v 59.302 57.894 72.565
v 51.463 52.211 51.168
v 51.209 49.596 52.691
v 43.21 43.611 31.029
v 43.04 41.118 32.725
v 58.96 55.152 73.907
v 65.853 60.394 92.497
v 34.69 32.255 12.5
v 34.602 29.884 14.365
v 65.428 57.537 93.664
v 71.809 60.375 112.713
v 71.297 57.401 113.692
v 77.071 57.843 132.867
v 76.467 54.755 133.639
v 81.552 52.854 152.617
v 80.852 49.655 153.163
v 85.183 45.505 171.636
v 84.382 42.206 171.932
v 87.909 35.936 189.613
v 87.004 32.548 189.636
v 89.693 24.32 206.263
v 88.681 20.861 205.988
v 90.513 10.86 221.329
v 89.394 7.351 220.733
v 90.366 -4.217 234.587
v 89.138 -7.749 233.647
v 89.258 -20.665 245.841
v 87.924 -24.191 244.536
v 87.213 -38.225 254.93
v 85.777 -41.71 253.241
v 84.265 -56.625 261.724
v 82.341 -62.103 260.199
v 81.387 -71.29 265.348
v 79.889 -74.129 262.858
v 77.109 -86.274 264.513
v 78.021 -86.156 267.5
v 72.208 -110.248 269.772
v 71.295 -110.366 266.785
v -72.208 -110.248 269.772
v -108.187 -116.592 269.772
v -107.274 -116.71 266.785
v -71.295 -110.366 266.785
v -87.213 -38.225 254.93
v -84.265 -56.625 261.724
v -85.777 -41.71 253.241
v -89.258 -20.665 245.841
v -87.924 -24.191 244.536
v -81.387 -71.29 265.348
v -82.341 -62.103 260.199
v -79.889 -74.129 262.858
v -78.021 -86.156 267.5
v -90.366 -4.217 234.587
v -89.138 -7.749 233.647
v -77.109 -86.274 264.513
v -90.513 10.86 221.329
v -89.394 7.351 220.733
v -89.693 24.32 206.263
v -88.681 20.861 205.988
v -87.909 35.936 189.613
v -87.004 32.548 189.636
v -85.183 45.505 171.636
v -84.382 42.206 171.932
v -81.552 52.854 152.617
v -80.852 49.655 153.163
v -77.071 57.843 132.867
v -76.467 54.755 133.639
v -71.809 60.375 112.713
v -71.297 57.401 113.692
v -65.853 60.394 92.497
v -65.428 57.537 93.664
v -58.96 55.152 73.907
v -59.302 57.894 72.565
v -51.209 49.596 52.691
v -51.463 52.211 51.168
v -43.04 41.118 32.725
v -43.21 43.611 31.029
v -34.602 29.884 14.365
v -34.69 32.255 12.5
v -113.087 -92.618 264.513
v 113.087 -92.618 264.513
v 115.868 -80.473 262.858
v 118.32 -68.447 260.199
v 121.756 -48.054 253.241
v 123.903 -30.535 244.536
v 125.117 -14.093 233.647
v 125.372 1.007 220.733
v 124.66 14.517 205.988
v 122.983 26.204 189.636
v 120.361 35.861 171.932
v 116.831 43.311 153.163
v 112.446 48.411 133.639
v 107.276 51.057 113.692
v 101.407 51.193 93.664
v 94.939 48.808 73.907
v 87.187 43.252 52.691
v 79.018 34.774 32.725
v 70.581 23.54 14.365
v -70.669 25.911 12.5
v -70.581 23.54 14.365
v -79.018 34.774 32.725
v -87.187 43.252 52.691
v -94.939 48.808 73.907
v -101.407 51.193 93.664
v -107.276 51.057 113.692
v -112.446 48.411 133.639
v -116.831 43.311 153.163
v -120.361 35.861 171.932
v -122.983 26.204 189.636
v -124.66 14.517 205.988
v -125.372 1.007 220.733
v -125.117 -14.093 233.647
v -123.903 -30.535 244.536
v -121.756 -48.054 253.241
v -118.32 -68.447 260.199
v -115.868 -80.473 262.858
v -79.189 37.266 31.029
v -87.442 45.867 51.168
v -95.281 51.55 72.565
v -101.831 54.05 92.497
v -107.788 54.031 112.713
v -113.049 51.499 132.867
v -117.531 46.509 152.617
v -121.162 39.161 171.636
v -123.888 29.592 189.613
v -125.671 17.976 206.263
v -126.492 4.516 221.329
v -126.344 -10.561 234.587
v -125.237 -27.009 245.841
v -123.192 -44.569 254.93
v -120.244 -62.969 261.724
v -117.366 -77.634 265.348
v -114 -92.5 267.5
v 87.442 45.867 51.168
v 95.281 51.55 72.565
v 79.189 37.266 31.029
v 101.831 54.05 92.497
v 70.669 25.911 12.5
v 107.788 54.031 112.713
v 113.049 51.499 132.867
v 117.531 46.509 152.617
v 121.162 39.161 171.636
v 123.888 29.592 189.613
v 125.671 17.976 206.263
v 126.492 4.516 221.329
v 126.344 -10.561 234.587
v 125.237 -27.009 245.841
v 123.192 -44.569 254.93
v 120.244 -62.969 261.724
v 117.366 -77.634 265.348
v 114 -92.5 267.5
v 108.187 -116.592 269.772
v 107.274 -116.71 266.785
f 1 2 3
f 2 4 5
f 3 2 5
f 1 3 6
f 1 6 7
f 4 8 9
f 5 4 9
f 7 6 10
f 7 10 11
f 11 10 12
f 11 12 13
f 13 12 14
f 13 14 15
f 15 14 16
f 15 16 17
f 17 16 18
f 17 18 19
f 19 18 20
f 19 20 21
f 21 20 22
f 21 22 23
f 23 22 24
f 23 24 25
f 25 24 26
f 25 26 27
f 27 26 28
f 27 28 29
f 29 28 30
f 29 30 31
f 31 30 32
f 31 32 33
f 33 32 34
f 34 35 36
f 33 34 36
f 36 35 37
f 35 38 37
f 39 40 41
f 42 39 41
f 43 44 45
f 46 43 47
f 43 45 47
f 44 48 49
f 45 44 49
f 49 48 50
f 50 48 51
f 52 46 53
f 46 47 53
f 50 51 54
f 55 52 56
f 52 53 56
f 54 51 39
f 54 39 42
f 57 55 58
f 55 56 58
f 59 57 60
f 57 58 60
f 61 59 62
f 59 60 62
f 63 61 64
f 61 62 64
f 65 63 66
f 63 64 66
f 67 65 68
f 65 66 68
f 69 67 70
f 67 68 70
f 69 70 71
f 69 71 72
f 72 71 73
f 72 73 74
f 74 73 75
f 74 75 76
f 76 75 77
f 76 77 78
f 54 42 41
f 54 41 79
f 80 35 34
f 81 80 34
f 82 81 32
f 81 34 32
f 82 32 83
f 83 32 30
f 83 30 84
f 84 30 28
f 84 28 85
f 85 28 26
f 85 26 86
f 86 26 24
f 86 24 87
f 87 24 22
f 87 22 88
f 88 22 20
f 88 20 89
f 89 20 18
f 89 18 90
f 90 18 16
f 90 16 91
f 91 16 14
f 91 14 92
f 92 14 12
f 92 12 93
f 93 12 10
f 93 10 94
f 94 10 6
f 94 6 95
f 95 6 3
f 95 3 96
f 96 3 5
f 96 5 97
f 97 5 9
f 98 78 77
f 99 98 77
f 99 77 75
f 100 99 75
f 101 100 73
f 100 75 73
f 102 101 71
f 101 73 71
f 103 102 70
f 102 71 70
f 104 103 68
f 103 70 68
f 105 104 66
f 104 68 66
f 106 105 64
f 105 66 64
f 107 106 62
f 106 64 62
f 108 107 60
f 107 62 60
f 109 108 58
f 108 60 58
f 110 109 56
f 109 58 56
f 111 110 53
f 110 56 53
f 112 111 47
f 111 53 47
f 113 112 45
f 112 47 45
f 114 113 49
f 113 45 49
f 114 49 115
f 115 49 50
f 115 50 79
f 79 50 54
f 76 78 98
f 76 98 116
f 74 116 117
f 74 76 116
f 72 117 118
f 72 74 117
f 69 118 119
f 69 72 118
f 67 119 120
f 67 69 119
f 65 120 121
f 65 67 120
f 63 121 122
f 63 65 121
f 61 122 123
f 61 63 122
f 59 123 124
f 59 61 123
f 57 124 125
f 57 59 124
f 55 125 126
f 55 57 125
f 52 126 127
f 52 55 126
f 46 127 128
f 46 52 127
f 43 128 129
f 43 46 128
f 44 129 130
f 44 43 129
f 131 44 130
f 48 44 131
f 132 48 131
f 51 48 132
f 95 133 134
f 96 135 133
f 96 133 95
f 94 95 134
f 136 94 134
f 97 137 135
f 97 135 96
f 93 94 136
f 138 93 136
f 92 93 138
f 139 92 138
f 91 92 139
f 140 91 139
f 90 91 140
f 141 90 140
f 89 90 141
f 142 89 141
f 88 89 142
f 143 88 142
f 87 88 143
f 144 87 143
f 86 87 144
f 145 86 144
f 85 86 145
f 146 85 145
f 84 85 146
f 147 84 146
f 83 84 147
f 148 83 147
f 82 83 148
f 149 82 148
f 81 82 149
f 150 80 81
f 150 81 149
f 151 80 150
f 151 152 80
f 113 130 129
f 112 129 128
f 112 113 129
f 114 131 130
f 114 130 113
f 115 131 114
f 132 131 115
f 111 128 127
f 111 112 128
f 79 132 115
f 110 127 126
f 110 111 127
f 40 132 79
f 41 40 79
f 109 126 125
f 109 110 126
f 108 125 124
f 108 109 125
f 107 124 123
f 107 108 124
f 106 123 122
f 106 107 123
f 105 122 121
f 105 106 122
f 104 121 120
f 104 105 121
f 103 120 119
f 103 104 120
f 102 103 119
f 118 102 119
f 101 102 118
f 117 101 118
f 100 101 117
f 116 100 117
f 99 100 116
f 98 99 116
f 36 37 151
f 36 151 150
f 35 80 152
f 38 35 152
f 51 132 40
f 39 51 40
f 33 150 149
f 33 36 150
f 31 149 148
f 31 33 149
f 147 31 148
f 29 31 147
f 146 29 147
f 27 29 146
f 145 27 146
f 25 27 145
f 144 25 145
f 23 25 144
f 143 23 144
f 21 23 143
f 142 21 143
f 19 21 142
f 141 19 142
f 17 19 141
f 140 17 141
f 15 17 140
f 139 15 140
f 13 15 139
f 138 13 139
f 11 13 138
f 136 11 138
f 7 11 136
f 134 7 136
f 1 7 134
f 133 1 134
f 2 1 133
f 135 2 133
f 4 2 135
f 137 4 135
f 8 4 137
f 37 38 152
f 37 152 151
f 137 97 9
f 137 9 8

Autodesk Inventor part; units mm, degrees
ref_plane "XY Plane" through (0, 0, 0) normal (0, 0, 1) x (1, 0, 0)
ref_plane "作業平面2" through (70.6693, 25.9112, 12.5) normal (0.9287275, -0.2499237, -0.2738674) x (0.1523203, -0.4162505, 0.8964006)
ref_plane "作業平面1" through (70.6693, 25.9112, 12.5) normal (0, -0.906984, -0.421165) x (0.1523203, -0.4162505, 0.8964006)
ref_plane "作業平面5" through (72.5487, 25.2272, 16.5) normal (0.9848078, -0.1736482, 0) x (0, 0, 1)
ref_plane "作業平面4" through (0, 0, 0) normal (0.9848078, -0.1736482, 0) x (0, 0, 1)
sketch "スケッチ4" plane through (72.5487, 25.2272, 16.5) normal (0.9848078, -0.1736482, 0) x (0, 0, 1)
  arc A0 (-4, -0.3473) -> (251, 108.7407) centre (93.9958, 123.1646) ccw
  arc A1 (-2.1354, 2.0028) -> (248.0126, 109.0151) centre (93.9958, 123.1646) ccw
  line L0 (-2.1354, 2.0028) -> (-4, -0.3473)
  line L1 (251, 108.7407) -> (248.0126, 109.0151)
  line L2 (251, 108.7407) -> (248.0126, 109.0151)
  line L3 (248.0126, 109.0151) -> (250.285, 133.7505)
  line L4 (250.285, 133.7505) -> (253.2724, 133.476)
  line L5 (253.2724, 133.476) -> (251, 108.7407)
  point P0 (-16.5, 37.4419)
  dimension "d10" = 3
extrude "押し出し4" add sketch "スケッチ4" along normal mid plane 200
sketch "スケッチ5" plane through (70.6693, 25.9112, 12.5) normal (0.9287275, -0.2499237, -0.2738674) x (0.1523203, -0.4162505, 0.8964006)
  line L0 (-182.7887, -200.8557) -> (555.7515, -200.8557)
  line L1 (555.7515, -200.8557) -> (555.7515, 275.1143)
  line L2 (555.7515, 275.1143) -> (-182.7887, 275.1143)
  line L3 (-182.7887, 275.1143) -> (-182.7887, -200.8557)
  point P0 (-11.1838, 50.897)
extrude "押し出し5" cut sketch "スケッチ5" along normal through all
ref_plane "作業平面6" through (38.1638, 34.6585, 22.0854) normal (0.9287275, -0.2499237, -0.2738674) x (0.1523203, -0.4162505, 0.8964006)
sketch "スケッチ6" plane through (38.1638, 34.6585, 22.0854) normal (0.9287275, -0.2499237, -0.2738674) x (0.1523203, -0.4162505, 0.8964006)
  line L0 (-129.6846, -185.1212) -> (393.489, -185.1212)
  line L1 (393.489, -185.1212) -> (393.489, 176.7734)
  line L2 (393.489, 176.7734) -> (-129.6846, 176.7734)
  line L3 (-129.6846, 176.7734) -> (-129.6846, -185.1212)
  point P0 (-11.1838, 50.897)
extrude "押し出し6" cut sketch "スケッチ6" against normal through all
mirror "ミラー1" about plane through (0, 0, 0) normal (1, 0, 0)
ref_plane "作業平面8" through (141.4575, -77.8279, 12.5) normal (0.3420201, 0.9396926, 0) x (0, 0, 1)
ref_plane "作業平面7" through (0, 0, 0) normal (0.3420201, 0.9396926, 0) x (0, 0, 1)
properties part number "belt"
